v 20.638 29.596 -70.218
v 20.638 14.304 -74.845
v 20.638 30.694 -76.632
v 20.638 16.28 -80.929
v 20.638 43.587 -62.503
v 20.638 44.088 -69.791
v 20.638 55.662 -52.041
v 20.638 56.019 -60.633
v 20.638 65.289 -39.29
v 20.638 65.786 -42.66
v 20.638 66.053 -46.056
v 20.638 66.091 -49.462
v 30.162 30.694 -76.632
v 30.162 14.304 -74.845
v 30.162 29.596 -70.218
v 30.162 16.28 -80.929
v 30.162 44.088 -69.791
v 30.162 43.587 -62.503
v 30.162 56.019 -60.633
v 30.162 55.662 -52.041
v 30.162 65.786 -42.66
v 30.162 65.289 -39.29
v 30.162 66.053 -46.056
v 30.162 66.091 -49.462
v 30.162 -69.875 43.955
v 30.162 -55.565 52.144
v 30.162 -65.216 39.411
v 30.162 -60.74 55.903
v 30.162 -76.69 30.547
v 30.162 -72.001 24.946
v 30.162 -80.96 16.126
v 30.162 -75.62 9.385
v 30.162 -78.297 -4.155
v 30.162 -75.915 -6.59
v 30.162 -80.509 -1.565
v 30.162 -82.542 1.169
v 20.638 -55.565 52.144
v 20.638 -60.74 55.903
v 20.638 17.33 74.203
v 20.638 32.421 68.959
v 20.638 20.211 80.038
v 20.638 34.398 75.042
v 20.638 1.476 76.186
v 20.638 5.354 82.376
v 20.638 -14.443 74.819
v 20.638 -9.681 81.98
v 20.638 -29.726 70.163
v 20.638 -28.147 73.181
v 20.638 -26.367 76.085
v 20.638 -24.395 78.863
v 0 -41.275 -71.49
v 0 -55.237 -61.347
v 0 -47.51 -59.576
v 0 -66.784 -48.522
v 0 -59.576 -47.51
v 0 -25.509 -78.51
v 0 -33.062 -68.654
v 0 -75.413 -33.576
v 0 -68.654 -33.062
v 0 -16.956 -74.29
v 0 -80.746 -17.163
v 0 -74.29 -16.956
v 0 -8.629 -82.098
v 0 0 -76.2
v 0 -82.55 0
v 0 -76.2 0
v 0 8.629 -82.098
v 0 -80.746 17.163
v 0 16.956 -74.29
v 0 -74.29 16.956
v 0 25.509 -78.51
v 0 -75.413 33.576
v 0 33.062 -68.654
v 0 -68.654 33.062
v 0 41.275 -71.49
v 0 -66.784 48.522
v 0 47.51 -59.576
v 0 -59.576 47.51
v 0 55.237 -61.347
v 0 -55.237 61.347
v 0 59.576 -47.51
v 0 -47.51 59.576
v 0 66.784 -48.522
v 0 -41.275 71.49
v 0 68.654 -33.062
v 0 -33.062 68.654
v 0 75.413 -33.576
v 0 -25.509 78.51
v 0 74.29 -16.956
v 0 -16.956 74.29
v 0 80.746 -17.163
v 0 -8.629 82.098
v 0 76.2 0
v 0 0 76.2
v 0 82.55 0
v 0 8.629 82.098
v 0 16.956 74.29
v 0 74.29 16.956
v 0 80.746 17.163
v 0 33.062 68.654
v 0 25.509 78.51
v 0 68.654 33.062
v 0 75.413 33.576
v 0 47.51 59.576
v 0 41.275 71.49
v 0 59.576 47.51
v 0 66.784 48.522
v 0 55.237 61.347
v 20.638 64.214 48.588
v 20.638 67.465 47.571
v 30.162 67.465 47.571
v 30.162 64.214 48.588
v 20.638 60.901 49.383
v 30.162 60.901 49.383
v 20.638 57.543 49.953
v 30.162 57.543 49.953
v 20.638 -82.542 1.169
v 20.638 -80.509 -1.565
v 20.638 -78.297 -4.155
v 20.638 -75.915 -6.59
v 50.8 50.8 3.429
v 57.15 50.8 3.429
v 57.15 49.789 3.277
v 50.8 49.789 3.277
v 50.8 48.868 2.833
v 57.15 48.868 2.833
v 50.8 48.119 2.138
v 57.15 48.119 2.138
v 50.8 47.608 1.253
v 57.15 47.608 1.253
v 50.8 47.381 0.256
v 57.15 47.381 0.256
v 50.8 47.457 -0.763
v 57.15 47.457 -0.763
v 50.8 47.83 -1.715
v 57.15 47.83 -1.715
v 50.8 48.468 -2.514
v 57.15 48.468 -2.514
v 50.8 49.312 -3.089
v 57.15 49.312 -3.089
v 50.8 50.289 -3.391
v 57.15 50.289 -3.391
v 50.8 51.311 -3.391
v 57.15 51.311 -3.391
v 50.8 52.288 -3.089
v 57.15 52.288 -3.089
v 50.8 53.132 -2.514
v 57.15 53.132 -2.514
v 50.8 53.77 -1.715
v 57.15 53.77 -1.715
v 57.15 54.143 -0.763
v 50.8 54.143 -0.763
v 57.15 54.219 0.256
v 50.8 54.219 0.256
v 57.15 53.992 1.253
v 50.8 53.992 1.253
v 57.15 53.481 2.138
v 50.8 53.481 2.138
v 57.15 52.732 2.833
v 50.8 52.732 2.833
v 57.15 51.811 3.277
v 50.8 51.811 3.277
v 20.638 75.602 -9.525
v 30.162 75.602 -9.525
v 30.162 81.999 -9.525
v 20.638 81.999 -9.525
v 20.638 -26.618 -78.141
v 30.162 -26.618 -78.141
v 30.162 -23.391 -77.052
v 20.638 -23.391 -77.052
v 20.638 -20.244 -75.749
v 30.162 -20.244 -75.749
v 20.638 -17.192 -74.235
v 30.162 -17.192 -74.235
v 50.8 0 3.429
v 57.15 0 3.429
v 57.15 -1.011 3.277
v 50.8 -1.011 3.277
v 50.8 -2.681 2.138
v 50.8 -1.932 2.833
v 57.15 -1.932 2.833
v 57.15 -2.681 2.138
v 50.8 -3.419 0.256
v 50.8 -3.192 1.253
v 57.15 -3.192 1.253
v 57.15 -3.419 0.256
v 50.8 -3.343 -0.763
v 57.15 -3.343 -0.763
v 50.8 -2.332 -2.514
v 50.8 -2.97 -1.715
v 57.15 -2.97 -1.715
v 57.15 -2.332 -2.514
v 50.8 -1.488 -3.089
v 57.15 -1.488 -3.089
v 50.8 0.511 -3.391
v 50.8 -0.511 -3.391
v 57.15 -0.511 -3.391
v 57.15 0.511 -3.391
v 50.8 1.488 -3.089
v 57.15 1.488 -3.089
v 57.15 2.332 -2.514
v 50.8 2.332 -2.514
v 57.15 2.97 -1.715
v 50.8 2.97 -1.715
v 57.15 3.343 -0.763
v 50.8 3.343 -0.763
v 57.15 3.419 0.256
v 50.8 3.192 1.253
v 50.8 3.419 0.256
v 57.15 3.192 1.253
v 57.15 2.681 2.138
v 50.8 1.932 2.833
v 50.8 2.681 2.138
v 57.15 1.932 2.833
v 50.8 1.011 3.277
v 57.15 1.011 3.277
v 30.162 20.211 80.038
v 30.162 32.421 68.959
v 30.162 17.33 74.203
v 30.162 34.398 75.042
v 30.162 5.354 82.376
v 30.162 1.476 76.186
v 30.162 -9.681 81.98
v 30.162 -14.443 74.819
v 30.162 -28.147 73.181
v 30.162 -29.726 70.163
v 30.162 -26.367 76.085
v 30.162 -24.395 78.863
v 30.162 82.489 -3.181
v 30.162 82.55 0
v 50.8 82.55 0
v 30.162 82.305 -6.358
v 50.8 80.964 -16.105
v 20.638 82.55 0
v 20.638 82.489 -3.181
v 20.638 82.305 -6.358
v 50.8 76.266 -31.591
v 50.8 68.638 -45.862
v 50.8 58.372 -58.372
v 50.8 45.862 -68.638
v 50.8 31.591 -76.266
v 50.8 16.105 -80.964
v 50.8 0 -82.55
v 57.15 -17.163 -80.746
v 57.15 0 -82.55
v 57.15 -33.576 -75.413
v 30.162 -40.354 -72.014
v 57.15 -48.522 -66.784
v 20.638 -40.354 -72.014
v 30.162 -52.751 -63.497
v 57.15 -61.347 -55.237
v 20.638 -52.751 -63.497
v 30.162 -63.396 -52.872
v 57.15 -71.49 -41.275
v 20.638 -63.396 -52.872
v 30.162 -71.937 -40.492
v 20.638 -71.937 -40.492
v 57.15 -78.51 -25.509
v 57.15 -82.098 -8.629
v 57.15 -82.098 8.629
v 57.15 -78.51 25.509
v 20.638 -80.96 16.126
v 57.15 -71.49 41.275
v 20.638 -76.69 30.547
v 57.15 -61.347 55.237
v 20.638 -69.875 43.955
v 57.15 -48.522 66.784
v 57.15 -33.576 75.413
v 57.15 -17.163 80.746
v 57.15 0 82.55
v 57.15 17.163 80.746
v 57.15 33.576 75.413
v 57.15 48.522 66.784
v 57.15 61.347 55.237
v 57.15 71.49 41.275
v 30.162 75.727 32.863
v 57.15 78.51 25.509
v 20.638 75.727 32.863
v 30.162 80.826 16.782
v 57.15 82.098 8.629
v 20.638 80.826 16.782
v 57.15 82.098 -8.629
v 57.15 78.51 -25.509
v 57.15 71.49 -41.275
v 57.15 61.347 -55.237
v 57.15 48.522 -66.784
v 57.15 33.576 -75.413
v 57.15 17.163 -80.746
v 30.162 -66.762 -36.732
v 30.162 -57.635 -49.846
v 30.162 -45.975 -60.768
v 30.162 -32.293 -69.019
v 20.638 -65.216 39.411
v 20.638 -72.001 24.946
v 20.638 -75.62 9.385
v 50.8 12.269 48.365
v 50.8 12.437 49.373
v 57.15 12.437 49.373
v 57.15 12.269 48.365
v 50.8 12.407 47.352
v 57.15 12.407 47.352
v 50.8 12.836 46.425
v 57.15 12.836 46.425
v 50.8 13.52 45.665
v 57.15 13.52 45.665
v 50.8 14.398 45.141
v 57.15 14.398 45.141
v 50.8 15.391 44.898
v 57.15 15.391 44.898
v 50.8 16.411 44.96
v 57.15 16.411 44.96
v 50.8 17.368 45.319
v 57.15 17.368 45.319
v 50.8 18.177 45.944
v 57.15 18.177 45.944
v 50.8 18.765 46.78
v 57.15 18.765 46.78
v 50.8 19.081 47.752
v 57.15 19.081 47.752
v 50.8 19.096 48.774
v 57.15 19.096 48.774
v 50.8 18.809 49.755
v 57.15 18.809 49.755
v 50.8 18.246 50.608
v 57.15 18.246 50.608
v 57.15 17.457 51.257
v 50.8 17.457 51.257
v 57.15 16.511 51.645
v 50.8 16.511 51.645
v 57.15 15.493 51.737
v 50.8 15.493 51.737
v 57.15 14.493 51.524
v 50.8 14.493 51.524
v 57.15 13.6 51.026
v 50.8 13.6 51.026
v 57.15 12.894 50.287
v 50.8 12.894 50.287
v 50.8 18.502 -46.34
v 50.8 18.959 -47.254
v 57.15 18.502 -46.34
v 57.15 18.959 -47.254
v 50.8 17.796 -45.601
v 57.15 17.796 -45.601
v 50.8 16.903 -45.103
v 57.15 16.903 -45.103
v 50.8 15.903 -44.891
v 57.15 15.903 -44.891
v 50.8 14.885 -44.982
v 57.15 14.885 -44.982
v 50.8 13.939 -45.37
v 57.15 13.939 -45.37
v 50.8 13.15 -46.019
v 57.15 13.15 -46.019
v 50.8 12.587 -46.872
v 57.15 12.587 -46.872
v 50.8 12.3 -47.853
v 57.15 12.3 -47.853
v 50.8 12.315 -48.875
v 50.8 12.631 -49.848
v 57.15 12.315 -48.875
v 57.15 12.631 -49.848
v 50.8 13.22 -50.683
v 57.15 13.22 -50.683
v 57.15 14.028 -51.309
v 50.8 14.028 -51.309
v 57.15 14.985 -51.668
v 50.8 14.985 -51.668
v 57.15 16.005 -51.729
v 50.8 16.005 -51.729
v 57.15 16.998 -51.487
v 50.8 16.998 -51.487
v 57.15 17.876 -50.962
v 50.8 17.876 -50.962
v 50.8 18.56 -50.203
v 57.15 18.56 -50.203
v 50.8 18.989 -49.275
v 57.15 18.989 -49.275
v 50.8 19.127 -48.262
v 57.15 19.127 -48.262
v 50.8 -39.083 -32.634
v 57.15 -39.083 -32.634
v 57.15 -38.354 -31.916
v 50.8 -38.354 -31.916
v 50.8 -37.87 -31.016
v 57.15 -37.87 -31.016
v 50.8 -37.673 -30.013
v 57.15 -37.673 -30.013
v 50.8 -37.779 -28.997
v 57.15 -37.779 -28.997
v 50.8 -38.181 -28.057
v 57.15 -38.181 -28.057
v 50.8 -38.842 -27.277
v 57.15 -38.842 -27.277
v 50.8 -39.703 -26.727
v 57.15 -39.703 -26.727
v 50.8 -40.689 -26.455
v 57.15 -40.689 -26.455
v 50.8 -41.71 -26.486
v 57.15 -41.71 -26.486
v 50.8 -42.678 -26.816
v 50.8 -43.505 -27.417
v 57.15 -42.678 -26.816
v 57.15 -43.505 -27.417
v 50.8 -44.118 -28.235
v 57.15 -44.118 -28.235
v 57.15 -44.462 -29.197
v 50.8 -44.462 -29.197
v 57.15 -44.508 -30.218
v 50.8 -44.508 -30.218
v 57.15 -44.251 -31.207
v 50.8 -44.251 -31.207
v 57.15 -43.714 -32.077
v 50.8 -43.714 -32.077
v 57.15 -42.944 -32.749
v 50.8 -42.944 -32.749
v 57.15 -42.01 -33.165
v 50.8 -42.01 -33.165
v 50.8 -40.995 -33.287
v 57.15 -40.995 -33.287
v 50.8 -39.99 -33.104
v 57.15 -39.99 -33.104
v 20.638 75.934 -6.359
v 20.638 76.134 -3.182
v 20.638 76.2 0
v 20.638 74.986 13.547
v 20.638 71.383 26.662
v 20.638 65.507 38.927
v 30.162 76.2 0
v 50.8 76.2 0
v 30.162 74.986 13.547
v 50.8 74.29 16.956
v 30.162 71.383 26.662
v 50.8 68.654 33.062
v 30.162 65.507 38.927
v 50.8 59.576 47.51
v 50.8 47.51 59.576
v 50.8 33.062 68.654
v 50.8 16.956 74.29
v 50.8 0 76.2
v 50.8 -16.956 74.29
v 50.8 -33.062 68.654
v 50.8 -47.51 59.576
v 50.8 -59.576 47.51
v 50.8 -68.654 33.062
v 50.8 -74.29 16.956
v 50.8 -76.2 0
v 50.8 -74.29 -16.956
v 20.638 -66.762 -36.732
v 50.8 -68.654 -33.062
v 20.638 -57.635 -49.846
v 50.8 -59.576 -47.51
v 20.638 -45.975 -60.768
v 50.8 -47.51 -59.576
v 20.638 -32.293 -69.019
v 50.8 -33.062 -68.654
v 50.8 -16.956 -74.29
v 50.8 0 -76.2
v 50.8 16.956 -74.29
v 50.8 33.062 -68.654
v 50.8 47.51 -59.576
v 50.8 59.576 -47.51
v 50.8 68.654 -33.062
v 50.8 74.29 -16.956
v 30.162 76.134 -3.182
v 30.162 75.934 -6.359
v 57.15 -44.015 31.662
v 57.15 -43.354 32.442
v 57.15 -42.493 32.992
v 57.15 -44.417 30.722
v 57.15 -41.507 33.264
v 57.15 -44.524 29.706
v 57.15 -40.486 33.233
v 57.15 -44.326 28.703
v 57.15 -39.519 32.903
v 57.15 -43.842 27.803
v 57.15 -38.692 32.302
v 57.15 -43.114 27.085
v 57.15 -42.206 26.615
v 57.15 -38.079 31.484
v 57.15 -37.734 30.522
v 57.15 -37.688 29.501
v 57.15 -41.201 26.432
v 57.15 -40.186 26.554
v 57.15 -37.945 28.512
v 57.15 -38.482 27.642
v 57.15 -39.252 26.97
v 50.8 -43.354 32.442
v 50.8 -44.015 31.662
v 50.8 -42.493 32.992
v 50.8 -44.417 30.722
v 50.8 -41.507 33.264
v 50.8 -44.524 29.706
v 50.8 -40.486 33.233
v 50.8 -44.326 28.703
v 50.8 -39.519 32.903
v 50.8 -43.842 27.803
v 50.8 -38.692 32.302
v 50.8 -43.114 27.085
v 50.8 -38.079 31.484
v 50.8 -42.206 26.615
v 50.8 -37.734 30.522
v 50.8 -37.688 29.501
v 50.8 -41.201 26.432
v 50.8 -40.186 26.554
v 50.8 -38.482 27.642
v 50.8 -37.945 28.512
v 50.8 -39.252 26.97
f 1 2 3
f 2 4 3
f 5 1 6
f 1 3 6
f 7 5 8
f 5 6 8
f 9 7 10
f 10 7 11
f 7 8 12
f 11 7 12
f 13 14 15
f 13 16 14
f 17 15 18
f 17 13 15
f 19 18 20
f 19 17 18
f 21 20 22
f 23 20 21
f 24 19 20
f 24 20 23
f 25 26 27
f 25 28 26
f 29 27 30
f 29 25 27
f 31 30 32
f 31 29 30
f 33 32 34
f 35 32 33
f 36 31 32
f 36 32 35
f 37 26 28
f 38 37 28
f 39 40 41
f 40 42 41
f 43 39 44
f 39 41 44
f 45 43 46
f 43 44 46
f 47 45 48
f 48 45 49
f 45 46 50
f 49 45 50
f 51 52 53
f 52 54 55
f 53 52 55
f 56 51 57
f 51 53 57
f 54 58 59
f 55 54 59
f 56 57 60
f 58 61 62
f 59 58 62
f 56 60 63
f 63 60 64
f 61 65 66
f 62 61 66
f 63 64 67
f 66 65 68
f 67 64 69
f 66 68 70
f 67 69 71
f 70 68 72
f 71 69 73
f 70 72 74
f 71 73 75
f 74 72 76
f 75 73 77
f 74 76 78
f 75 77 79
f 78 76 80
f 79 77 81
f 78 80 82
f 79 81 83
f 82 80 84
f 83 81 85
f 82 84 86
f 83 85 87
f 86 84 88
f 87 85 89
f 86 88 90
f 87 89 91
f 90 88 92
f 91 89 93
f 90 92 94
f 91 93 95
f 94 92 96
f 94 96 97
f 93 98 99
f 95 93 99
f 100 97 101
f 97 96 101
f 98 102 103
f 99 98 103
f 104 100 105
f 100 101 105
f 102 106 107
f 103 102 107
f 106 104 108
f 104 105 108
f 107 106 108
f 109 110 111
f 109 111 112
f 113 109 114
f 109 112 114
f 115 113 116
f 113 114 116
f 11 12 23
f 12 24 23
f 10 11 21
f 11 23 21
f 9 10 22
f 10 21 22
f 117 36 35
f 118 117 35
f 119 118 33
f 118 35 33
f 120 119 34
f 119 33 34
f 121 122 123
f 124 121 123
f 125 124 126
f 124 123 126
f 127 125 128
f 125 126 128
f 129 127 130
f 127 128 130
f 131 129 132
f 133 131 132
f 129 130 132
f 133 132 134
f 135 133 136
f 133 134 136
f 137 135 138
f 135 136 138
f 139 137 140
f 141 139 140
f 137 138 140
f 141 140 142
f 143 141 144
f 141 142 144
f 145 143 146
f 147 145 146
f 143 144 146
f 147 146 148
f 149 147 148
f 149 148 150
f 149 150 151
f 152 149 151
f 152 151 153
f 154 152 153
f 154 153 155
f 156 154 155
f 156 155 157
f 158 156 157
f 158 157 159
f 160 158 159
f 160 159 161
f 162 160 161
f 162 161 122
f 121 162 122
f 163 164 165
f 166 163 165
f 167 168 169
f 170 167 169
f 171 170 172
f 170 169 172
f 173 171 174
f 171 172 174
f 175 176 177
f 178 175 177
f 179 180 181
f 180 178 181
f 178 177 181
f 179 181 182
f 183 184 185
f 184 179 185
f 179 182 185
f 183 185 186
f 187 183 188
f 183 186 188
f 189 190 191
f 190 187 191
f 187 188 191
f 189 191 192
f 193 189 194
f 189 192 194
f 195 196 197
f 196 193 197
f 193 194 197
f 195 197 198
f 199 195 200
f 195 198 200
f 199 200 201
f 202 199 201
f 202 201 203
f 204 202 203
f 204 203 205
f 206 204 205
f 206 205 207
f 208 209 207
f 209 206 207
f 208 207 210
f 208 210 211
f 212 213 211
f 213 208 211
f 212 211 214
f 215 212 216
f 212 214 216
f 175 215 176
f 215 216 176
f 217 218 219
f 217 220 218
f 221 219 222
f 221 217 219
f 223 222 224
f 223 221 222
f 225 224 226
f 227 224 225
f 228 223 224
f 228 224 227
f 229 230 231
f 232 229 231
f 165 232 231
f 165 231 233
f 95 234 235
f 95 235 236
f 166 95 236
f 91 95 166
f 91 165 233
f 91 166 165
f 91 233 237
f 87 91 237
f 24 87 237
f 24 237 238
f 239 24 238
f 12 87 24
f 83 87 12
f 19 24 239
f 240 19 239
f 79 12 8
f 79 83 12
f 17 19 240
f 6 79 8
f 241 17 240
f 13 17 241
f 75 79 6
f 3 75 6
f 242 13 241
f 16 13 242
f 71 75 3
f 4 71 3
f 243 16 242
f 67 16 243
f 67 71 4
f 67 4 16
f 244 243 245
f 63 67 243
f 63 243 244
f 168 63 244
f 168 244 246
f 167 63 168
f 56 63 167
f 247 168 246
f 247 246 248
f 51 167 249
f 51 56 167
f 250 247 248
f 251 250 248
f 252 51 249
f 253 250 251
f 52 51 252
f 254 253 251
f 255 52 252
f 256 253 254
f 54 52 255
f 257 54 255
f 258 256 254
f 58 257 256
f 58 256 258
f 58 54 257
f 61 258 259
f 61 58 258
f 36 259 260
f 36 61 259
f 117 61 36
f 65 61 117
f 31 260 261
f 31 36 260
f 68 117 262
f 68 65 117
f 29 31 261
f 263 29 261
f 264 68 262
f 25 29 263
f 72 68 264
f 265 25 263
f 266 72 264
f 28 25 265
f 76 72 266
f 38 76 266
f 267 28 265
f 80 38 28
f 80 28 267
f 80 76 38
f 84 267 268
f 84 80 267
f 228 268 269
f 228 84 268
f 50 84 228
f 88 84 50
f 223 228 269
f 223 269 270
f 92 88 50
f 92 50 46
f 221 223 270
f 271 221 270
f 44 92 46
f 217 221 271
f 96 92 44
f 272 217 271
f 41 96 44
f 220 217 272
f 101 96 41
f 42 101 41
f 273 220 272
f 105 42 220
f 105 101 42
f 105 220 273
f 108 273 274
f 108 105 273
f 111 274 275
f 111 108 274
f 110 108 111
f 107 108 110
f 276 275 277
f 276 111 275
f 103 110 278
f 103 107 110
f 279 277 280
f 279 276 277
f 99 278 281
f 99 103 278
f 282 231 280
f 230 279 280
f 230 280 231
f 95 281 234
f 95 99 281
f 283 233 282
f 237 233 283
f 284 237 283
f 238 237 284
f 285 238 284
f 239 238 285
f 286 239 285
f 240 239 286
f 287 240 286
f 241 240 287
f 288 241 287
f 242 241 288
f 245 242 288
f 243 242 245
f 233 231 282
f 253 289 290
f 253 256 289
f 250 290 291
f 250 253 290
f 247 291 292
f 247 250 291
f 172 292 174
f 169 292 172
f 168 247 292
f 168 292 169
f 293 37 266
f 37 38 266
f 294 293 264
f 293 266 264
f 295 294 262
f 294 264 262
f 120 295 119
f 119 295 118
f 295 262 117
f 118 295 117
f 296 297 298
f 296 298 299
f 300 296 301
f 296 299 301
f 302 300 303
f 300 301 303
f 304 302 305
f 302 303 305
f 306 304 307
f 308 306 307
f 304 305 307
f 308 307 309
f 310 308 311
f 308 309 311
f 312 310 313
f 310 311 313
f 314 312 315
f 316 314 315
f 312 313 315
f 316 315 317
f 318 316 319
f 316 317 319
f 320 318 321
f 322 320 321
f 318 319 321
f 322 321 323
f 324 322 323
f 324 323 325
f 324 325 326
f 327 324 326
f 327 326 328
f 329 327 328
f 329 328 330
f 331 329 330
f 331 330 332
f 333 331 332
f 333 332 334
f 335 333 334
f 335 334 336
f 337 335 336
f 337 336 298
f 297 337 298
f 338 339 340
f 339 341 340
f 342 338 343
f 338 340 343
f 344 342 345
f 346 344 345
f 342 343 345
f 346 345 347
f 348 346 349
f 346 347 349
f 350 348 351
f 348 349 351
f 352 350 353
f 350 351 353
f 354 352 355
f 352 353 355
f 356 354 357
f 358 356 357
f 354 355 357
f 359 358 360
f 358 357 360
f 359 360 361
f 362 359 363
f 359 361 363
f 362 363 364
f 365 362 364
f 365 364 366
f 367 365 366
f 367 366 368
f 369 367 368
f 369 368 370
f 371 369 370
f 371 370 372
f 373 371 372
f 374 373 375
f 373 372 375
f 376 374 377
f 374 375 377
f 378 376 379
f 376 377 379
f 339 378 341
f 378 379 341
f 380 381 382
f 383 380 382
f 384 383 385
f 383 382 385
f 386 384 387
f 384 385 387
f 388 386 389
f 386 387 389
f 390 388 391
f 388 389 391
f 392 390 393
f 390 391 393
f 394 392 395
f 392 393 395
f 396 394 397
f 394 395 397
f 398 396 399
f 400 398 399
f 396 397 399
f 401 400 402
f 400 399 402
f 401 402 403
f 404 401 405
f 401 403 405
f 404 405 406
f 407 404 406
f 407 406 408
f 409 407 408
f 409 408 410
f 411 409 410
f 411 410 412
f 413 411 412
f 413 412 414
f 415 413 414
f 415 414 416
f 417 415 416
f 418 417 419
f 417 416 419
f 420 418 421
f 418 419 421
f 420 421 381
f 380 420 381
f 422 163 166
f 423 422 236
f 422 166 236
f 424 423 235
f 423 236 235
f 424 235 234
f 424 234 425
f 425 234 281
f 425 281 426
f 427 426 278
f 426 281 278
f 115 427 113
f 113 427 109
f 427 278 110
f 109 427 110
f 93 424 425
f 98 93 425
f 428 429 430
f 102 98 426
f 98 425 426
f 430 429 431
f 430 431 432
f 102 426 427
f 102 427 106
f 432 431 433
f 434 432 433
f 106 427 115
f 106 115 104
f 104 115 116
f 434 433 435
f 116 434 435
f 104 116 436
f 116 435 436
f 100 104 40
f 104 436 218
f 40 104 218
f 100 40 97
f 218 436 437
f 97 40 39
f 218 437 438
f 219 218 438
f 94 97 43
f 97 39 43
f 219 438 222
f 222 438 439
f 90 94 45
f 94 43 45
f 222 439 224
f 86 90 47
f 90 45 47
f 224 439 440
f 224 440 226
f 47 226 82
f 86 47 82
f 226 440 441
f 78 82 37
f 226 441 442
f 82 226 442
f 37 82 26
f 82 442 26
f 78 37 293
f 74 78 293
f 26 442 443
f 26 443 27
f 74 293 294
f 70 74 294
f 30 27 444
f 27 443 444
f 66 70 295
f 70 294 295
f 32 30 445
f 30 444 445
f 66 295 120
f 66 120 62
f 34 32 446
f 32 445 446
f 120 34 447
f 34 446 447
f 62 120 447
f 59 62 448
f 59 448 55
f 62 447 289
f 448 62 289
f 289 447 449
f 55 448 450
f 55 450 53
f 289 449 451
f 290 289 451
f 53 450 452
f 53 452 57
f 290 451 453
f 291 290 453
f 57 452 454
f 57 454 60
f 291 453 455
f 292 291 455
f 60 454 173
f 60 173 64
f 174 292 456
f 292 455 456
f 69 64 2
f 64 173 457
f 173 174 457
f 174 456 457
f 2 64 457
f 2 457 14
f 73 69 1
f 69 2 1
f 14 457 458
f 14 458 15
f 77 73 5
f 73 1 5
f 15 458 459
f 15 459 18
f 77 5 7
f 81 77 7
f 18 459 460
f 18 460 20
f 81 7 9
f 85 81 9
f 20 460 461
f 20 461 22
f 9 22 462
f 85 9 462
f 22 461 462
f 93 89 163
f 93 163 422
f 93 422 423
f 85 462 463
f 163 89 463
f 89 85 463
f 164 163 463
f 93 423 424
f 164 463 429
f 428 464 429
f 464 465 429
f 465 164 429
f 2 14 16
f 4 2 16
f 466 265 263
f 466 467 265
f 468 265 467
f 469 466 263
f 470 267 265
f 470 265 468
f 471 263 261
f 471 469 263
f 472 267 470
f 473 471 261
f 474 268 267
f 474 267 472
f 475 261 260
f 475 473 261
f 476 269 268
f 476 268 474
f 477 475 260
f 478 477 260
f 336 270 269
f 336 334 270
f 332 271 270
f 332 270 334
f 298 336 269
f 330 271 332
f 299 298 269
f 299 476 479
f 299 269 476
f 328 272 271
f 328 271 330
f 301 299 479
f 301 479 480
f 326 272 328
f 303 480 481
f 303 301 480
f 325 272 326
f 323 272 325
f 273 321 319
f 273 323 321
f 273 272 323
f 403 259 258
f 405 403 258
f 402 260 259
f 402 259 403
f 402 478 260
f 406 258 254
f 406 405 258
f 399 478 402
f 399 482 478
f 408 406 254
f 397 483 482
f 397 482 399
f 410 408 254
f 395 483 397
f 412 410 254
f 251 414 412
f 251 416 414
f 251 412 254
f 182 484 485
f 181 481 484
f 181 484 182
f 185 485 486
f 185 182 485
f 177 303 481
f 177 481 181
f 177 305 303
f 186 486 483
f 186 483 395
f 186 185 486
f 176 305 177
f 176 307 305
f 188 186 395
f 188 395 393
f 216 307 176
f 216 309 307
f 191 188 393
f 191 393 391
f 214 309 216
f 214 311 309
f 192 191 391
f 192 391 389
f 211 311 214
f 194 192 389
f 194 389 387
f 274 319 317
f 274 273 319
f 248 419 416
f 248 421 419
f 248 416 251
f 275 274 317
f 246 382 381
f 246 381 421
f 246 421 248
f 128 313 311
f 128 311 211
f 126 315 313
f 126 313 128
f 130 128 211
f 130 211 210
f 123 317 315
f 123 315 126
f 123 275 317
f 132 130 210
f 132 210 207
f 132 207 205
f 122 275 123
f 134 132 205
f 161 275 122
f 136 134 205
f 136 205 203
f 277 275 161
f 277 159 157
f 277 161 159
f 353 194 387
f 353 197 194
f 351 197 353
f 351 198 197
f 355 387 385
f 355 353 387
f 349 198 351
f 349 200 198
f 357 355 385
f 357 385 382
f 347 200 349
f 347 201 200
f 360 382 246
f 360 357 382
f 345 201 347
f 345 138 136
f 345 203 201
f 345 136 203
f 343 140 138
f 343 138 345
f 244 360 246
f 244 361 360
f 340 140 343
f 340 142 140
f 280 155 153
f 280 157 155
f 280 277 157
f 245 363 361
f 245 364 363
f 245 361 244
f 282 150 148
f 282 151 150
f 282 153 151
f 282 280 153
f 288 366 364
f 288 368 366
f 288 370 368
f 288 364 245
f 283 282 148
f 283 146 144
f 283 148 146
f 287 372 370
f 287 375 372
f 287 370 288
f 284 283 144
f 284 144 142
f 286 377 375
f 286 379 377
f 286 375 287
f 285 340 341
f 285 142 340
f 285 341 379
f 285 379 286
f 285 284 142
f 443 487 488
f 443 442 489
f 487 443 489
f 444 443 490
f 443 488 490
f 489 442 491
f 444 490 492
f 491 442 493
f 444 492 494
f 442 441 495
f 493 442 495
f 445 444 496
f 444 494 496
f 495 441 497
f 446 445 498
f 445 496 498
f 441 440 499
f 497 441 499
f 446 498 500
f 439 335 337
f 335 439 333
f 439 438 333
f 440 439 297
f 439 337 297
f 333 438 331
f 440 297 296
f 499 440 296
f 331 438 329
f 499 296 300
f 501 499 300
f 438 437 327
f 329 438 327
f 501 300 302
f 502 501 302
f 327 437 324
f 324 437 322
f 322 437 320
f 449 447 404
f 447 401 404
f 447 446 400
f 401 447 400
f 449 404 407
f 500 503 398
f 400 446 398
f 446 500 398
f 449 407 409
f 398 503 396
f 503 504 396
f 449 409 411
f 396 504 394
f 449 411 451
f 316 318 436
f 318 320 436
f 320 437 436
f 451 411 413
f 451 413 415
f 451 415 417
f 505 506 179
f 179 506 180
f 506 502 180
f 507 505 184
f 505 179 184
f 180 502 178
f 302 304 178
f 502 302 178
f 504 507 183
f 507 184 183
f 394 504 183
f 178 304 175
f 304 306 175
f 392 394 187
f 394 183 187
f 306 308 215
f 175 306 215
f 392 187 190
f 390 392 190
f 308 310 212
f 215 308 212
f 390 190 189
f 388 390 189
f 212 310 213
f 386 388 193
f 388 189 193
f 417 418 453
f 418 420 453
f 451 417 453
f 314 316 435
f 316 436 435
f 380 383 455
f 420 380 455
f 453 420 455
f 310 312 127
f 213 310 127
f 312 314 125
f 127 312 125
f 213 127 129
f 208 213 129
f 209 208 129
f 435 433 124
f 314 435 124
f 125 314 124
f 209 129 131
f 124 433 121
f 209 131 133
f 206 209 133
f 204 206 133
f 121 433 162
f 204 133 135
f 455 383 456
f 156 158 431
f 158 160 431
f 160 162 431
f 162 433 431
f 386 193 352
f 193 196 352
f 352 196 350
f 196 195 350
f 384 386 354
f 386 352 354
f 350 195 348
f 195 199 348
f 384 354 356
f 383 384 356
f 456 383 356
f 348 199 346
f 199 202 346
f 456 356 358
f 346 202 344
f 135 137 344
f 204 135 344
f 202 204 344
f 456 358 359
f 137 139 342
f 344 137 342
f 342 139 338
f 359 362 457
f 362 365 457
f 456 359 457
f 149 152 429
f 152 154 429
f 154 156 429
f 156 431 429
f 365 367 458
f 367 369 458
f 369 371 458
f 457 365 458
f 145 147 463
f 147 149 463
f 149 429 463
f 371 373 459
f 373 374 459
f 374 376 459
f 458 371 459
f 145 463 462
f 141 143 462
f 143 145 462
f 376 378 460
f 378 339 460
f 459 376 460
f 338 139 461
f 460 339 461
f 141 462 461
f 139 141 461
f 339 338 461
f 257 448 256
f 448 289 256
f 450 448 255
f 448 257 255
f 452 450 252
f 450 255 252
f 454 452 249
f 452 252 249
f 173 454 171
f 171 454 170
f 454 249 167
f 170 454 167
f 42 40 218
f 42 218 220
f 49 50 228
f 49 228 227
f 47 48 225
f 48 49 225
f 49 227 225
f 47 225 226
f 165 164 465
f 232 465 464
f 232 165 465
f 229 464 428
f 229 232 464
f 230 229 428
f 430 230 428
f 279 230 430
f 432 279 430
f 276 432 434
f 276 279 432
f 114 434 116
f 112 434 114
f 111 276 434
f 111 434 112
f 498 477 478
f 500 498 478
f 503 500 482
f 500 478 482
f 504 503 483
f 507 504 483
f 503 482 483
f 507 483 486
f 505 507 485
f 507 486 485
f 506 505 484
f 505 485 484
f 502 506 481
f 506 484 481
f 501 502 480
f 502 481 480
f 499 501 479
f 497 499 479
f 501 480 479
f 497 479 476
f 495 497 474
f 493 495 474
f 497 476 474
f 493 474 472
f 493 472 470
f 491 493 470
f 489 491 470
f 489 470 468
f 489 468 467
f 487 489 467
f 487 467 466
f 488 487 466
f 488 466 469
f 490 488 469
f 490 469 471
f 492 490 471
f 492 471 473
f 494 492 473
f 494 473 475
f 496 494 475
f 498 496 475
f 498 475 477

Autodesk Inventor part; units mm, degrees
ref_plane "YZ Plane" through (0, 0, 0) normal (1, 0, 0) x (0, 1, 0)
ref_plane "XZ Plane" through (0, 0, 0) normal (0, 1, 0) x (-1, 0, 0)
sketch "Sketch1" plane through (0, 0, 0) normal (0, 0, 1) x (1, 0, 0)
  line L0 (0, 0) -> (50.8, 0) construction
  line L1 (0, 82.55) -> (0, 76.2)
  line L2 (0, 76.2) -> (50.8, 76.2)
  line L3 (50.8, 76.2) -> (50.8, 82.55)
  line L4 (50.8, 82.55) -> (0, 82.55)
  dimension "d1" = 50.8
  dimension "d7" = 76.2
  dimension "d8" = 6.35
revolve "Revolution1" add sketch "Sketch1" angle 360 about axis through (0, 0, 0) along (1, 0, 0)
sketch "Sketch2" plane through (50.8, 0, 0) normal (1, 0, 0) x (0, 0, -1)
  circle A0 centre (0, 0) radius 82.55 projected
  circle A1 centre (0, 0) radius 76.2 projected
extrude "Extrusion1" add sketch "Sketch2" along normal blind 6.35 contours A0 | A1
sketch "Sketch3" plane through (50.8, 0, 0) normal (-1, 0, 0) x (0, 0, 1)
  point P0 (0, 0)
  point P1 (0, 50.8)
  point P2 (0, 0)
  dimension "d9" = 50.8
hole "Hole1" at (50.8, 50.8, 0) at (50.8, 0, 0) direction (1, 0, 0) diameter 6.858 end through all
pattern_circular "Circular Pattern1" count 5 over 360 about axis through (25.4, 0, 0) along (1, 0, 0) of "Hole1"
ref_plane "Work Plane1" through (25.4, 0, 0) normal (-1, 0, 0) x (0, 0, 1)
sketch "Sketch5" plane through (25.4, 0, 0) normal (-1, 0, 0) x (0, 0, 1)
  circle A0 centre (0, 0) radius 76.2 projected
  circle A1 centre (0, 0) radius 82.55 projected
  circle A2 centre (48.3137, 15.6981) radius 3.429 projected
  circle A3 centre (29.8595, -41.0981) radius 3.429 projected
  circle A4 centre (0, 50.8) radius 3.429 construction
  circle A5 centre (0, 0) radius 3.429 projected
  circle A6 centre (0, 0) radius 76.2 projected
  circle A7 centre (0, 50.8) radius 3.429 construction
  circle A8 centre (0, 50.8) radius 9.525 construction
  line L0 (0, 60.325) -> (49.1356, 60.325) construction
  line L1 (49.1356, 60.325) -> (49.1356, 41.275) construction
  line L2 (49.1356, 41.275) -> (0, 41.275) construction
  line L3 (0, 41.275) -> (0, 60.325) construction
  circle A9 centre (0, 50.8) radius 50.4056 construction
  circle A10 centre (0, 0) radius 76.2 projected
  arc A11 (49.9526, 57.5428) -> (47.5712, 67.4647) centre (0, 50.8) ccw
  line L4 (-9.525, 50.8) -> (-9.525, 81.9986) construction
  circle A12 centre (0, 0) radius 76.2 projected
  line L5 (-9.525, 75.6023) -> (-9.525, 81.9986)
  arc A13 (49.9526, 57.5428) -> (-9.525, 75.6023) centre (0, 0) ccw
  arc A14 (47.5712, 67.4647) -> (-9.525, 81.9986) centre (0, 0) ccw
  point P0 (49.9526, 57.5428)
  dimension "d27" = 19.05
  dimension "d28" = 19.05
  dimension "d29" = 49.1356
  dimension "d30" = 100.8113
  dimension "d31" = 82.55
extrude "Extrusion2" cut sketch "Sketch5" along normal mid plane 9.525 contours A0 L5 A1 A11 picked at (-1.9672, 80.2341)
pattern_circular "Circular Pattern2" count 5 over 360 about axis through (291.1792, 0, 0) along (-1, 0, 0) of "Extrusion2"
equation "\"d1\" = wheelDepth"
equation "\"d7\" = wheelR"
equation "\"d8\" = wheelThickness"
equation "\"d9\" = farFromCenter"
equation "\"d10\" = smallHoles"
equation "\"d27\" = swivelBaseDiameter"
equation "\"d28\" = d27"
equation "\"d29\" = swivelLegLength"
equation "\"d31\" = wheelR + wheelThickness"
equation "\"d32\" = 0.5 * swivelLegThickness"
equation "\"gearShaft\" = 6.35"
equation "\"largeGear\" = 38.1"
equation "\"smallGear\" = 12.7"
equation "\"wheelR\" = 76.2"
equation "\"wheelThickness\" = 6.35"
equation "\"wheelDepth\" = 50.8"
equation "\"mainHole\" = 6.858"
equation "\"smallHoles\" = 6.858"
equation "\"farFromCenter\" = 50.8"
equation "\"smallGearLength\" = 50.8"
equation "\"mainGearLength\" = 76.2"
equation "\"gearThickness\" = 6.35"
equation "\"mainGear\" = 38.1"
equation "\"d20\" = -0.5 * wheelDepth"
equation "\"swivelBaseDiameter\" = 19.05"
equation "\"swivelLegExtentions\" = 19.05"
equation "\"swivelLegLength\" = 49.13565"
equation "\"swivelLegThickness\" = 19.05"
properties part number "Wheel1"
